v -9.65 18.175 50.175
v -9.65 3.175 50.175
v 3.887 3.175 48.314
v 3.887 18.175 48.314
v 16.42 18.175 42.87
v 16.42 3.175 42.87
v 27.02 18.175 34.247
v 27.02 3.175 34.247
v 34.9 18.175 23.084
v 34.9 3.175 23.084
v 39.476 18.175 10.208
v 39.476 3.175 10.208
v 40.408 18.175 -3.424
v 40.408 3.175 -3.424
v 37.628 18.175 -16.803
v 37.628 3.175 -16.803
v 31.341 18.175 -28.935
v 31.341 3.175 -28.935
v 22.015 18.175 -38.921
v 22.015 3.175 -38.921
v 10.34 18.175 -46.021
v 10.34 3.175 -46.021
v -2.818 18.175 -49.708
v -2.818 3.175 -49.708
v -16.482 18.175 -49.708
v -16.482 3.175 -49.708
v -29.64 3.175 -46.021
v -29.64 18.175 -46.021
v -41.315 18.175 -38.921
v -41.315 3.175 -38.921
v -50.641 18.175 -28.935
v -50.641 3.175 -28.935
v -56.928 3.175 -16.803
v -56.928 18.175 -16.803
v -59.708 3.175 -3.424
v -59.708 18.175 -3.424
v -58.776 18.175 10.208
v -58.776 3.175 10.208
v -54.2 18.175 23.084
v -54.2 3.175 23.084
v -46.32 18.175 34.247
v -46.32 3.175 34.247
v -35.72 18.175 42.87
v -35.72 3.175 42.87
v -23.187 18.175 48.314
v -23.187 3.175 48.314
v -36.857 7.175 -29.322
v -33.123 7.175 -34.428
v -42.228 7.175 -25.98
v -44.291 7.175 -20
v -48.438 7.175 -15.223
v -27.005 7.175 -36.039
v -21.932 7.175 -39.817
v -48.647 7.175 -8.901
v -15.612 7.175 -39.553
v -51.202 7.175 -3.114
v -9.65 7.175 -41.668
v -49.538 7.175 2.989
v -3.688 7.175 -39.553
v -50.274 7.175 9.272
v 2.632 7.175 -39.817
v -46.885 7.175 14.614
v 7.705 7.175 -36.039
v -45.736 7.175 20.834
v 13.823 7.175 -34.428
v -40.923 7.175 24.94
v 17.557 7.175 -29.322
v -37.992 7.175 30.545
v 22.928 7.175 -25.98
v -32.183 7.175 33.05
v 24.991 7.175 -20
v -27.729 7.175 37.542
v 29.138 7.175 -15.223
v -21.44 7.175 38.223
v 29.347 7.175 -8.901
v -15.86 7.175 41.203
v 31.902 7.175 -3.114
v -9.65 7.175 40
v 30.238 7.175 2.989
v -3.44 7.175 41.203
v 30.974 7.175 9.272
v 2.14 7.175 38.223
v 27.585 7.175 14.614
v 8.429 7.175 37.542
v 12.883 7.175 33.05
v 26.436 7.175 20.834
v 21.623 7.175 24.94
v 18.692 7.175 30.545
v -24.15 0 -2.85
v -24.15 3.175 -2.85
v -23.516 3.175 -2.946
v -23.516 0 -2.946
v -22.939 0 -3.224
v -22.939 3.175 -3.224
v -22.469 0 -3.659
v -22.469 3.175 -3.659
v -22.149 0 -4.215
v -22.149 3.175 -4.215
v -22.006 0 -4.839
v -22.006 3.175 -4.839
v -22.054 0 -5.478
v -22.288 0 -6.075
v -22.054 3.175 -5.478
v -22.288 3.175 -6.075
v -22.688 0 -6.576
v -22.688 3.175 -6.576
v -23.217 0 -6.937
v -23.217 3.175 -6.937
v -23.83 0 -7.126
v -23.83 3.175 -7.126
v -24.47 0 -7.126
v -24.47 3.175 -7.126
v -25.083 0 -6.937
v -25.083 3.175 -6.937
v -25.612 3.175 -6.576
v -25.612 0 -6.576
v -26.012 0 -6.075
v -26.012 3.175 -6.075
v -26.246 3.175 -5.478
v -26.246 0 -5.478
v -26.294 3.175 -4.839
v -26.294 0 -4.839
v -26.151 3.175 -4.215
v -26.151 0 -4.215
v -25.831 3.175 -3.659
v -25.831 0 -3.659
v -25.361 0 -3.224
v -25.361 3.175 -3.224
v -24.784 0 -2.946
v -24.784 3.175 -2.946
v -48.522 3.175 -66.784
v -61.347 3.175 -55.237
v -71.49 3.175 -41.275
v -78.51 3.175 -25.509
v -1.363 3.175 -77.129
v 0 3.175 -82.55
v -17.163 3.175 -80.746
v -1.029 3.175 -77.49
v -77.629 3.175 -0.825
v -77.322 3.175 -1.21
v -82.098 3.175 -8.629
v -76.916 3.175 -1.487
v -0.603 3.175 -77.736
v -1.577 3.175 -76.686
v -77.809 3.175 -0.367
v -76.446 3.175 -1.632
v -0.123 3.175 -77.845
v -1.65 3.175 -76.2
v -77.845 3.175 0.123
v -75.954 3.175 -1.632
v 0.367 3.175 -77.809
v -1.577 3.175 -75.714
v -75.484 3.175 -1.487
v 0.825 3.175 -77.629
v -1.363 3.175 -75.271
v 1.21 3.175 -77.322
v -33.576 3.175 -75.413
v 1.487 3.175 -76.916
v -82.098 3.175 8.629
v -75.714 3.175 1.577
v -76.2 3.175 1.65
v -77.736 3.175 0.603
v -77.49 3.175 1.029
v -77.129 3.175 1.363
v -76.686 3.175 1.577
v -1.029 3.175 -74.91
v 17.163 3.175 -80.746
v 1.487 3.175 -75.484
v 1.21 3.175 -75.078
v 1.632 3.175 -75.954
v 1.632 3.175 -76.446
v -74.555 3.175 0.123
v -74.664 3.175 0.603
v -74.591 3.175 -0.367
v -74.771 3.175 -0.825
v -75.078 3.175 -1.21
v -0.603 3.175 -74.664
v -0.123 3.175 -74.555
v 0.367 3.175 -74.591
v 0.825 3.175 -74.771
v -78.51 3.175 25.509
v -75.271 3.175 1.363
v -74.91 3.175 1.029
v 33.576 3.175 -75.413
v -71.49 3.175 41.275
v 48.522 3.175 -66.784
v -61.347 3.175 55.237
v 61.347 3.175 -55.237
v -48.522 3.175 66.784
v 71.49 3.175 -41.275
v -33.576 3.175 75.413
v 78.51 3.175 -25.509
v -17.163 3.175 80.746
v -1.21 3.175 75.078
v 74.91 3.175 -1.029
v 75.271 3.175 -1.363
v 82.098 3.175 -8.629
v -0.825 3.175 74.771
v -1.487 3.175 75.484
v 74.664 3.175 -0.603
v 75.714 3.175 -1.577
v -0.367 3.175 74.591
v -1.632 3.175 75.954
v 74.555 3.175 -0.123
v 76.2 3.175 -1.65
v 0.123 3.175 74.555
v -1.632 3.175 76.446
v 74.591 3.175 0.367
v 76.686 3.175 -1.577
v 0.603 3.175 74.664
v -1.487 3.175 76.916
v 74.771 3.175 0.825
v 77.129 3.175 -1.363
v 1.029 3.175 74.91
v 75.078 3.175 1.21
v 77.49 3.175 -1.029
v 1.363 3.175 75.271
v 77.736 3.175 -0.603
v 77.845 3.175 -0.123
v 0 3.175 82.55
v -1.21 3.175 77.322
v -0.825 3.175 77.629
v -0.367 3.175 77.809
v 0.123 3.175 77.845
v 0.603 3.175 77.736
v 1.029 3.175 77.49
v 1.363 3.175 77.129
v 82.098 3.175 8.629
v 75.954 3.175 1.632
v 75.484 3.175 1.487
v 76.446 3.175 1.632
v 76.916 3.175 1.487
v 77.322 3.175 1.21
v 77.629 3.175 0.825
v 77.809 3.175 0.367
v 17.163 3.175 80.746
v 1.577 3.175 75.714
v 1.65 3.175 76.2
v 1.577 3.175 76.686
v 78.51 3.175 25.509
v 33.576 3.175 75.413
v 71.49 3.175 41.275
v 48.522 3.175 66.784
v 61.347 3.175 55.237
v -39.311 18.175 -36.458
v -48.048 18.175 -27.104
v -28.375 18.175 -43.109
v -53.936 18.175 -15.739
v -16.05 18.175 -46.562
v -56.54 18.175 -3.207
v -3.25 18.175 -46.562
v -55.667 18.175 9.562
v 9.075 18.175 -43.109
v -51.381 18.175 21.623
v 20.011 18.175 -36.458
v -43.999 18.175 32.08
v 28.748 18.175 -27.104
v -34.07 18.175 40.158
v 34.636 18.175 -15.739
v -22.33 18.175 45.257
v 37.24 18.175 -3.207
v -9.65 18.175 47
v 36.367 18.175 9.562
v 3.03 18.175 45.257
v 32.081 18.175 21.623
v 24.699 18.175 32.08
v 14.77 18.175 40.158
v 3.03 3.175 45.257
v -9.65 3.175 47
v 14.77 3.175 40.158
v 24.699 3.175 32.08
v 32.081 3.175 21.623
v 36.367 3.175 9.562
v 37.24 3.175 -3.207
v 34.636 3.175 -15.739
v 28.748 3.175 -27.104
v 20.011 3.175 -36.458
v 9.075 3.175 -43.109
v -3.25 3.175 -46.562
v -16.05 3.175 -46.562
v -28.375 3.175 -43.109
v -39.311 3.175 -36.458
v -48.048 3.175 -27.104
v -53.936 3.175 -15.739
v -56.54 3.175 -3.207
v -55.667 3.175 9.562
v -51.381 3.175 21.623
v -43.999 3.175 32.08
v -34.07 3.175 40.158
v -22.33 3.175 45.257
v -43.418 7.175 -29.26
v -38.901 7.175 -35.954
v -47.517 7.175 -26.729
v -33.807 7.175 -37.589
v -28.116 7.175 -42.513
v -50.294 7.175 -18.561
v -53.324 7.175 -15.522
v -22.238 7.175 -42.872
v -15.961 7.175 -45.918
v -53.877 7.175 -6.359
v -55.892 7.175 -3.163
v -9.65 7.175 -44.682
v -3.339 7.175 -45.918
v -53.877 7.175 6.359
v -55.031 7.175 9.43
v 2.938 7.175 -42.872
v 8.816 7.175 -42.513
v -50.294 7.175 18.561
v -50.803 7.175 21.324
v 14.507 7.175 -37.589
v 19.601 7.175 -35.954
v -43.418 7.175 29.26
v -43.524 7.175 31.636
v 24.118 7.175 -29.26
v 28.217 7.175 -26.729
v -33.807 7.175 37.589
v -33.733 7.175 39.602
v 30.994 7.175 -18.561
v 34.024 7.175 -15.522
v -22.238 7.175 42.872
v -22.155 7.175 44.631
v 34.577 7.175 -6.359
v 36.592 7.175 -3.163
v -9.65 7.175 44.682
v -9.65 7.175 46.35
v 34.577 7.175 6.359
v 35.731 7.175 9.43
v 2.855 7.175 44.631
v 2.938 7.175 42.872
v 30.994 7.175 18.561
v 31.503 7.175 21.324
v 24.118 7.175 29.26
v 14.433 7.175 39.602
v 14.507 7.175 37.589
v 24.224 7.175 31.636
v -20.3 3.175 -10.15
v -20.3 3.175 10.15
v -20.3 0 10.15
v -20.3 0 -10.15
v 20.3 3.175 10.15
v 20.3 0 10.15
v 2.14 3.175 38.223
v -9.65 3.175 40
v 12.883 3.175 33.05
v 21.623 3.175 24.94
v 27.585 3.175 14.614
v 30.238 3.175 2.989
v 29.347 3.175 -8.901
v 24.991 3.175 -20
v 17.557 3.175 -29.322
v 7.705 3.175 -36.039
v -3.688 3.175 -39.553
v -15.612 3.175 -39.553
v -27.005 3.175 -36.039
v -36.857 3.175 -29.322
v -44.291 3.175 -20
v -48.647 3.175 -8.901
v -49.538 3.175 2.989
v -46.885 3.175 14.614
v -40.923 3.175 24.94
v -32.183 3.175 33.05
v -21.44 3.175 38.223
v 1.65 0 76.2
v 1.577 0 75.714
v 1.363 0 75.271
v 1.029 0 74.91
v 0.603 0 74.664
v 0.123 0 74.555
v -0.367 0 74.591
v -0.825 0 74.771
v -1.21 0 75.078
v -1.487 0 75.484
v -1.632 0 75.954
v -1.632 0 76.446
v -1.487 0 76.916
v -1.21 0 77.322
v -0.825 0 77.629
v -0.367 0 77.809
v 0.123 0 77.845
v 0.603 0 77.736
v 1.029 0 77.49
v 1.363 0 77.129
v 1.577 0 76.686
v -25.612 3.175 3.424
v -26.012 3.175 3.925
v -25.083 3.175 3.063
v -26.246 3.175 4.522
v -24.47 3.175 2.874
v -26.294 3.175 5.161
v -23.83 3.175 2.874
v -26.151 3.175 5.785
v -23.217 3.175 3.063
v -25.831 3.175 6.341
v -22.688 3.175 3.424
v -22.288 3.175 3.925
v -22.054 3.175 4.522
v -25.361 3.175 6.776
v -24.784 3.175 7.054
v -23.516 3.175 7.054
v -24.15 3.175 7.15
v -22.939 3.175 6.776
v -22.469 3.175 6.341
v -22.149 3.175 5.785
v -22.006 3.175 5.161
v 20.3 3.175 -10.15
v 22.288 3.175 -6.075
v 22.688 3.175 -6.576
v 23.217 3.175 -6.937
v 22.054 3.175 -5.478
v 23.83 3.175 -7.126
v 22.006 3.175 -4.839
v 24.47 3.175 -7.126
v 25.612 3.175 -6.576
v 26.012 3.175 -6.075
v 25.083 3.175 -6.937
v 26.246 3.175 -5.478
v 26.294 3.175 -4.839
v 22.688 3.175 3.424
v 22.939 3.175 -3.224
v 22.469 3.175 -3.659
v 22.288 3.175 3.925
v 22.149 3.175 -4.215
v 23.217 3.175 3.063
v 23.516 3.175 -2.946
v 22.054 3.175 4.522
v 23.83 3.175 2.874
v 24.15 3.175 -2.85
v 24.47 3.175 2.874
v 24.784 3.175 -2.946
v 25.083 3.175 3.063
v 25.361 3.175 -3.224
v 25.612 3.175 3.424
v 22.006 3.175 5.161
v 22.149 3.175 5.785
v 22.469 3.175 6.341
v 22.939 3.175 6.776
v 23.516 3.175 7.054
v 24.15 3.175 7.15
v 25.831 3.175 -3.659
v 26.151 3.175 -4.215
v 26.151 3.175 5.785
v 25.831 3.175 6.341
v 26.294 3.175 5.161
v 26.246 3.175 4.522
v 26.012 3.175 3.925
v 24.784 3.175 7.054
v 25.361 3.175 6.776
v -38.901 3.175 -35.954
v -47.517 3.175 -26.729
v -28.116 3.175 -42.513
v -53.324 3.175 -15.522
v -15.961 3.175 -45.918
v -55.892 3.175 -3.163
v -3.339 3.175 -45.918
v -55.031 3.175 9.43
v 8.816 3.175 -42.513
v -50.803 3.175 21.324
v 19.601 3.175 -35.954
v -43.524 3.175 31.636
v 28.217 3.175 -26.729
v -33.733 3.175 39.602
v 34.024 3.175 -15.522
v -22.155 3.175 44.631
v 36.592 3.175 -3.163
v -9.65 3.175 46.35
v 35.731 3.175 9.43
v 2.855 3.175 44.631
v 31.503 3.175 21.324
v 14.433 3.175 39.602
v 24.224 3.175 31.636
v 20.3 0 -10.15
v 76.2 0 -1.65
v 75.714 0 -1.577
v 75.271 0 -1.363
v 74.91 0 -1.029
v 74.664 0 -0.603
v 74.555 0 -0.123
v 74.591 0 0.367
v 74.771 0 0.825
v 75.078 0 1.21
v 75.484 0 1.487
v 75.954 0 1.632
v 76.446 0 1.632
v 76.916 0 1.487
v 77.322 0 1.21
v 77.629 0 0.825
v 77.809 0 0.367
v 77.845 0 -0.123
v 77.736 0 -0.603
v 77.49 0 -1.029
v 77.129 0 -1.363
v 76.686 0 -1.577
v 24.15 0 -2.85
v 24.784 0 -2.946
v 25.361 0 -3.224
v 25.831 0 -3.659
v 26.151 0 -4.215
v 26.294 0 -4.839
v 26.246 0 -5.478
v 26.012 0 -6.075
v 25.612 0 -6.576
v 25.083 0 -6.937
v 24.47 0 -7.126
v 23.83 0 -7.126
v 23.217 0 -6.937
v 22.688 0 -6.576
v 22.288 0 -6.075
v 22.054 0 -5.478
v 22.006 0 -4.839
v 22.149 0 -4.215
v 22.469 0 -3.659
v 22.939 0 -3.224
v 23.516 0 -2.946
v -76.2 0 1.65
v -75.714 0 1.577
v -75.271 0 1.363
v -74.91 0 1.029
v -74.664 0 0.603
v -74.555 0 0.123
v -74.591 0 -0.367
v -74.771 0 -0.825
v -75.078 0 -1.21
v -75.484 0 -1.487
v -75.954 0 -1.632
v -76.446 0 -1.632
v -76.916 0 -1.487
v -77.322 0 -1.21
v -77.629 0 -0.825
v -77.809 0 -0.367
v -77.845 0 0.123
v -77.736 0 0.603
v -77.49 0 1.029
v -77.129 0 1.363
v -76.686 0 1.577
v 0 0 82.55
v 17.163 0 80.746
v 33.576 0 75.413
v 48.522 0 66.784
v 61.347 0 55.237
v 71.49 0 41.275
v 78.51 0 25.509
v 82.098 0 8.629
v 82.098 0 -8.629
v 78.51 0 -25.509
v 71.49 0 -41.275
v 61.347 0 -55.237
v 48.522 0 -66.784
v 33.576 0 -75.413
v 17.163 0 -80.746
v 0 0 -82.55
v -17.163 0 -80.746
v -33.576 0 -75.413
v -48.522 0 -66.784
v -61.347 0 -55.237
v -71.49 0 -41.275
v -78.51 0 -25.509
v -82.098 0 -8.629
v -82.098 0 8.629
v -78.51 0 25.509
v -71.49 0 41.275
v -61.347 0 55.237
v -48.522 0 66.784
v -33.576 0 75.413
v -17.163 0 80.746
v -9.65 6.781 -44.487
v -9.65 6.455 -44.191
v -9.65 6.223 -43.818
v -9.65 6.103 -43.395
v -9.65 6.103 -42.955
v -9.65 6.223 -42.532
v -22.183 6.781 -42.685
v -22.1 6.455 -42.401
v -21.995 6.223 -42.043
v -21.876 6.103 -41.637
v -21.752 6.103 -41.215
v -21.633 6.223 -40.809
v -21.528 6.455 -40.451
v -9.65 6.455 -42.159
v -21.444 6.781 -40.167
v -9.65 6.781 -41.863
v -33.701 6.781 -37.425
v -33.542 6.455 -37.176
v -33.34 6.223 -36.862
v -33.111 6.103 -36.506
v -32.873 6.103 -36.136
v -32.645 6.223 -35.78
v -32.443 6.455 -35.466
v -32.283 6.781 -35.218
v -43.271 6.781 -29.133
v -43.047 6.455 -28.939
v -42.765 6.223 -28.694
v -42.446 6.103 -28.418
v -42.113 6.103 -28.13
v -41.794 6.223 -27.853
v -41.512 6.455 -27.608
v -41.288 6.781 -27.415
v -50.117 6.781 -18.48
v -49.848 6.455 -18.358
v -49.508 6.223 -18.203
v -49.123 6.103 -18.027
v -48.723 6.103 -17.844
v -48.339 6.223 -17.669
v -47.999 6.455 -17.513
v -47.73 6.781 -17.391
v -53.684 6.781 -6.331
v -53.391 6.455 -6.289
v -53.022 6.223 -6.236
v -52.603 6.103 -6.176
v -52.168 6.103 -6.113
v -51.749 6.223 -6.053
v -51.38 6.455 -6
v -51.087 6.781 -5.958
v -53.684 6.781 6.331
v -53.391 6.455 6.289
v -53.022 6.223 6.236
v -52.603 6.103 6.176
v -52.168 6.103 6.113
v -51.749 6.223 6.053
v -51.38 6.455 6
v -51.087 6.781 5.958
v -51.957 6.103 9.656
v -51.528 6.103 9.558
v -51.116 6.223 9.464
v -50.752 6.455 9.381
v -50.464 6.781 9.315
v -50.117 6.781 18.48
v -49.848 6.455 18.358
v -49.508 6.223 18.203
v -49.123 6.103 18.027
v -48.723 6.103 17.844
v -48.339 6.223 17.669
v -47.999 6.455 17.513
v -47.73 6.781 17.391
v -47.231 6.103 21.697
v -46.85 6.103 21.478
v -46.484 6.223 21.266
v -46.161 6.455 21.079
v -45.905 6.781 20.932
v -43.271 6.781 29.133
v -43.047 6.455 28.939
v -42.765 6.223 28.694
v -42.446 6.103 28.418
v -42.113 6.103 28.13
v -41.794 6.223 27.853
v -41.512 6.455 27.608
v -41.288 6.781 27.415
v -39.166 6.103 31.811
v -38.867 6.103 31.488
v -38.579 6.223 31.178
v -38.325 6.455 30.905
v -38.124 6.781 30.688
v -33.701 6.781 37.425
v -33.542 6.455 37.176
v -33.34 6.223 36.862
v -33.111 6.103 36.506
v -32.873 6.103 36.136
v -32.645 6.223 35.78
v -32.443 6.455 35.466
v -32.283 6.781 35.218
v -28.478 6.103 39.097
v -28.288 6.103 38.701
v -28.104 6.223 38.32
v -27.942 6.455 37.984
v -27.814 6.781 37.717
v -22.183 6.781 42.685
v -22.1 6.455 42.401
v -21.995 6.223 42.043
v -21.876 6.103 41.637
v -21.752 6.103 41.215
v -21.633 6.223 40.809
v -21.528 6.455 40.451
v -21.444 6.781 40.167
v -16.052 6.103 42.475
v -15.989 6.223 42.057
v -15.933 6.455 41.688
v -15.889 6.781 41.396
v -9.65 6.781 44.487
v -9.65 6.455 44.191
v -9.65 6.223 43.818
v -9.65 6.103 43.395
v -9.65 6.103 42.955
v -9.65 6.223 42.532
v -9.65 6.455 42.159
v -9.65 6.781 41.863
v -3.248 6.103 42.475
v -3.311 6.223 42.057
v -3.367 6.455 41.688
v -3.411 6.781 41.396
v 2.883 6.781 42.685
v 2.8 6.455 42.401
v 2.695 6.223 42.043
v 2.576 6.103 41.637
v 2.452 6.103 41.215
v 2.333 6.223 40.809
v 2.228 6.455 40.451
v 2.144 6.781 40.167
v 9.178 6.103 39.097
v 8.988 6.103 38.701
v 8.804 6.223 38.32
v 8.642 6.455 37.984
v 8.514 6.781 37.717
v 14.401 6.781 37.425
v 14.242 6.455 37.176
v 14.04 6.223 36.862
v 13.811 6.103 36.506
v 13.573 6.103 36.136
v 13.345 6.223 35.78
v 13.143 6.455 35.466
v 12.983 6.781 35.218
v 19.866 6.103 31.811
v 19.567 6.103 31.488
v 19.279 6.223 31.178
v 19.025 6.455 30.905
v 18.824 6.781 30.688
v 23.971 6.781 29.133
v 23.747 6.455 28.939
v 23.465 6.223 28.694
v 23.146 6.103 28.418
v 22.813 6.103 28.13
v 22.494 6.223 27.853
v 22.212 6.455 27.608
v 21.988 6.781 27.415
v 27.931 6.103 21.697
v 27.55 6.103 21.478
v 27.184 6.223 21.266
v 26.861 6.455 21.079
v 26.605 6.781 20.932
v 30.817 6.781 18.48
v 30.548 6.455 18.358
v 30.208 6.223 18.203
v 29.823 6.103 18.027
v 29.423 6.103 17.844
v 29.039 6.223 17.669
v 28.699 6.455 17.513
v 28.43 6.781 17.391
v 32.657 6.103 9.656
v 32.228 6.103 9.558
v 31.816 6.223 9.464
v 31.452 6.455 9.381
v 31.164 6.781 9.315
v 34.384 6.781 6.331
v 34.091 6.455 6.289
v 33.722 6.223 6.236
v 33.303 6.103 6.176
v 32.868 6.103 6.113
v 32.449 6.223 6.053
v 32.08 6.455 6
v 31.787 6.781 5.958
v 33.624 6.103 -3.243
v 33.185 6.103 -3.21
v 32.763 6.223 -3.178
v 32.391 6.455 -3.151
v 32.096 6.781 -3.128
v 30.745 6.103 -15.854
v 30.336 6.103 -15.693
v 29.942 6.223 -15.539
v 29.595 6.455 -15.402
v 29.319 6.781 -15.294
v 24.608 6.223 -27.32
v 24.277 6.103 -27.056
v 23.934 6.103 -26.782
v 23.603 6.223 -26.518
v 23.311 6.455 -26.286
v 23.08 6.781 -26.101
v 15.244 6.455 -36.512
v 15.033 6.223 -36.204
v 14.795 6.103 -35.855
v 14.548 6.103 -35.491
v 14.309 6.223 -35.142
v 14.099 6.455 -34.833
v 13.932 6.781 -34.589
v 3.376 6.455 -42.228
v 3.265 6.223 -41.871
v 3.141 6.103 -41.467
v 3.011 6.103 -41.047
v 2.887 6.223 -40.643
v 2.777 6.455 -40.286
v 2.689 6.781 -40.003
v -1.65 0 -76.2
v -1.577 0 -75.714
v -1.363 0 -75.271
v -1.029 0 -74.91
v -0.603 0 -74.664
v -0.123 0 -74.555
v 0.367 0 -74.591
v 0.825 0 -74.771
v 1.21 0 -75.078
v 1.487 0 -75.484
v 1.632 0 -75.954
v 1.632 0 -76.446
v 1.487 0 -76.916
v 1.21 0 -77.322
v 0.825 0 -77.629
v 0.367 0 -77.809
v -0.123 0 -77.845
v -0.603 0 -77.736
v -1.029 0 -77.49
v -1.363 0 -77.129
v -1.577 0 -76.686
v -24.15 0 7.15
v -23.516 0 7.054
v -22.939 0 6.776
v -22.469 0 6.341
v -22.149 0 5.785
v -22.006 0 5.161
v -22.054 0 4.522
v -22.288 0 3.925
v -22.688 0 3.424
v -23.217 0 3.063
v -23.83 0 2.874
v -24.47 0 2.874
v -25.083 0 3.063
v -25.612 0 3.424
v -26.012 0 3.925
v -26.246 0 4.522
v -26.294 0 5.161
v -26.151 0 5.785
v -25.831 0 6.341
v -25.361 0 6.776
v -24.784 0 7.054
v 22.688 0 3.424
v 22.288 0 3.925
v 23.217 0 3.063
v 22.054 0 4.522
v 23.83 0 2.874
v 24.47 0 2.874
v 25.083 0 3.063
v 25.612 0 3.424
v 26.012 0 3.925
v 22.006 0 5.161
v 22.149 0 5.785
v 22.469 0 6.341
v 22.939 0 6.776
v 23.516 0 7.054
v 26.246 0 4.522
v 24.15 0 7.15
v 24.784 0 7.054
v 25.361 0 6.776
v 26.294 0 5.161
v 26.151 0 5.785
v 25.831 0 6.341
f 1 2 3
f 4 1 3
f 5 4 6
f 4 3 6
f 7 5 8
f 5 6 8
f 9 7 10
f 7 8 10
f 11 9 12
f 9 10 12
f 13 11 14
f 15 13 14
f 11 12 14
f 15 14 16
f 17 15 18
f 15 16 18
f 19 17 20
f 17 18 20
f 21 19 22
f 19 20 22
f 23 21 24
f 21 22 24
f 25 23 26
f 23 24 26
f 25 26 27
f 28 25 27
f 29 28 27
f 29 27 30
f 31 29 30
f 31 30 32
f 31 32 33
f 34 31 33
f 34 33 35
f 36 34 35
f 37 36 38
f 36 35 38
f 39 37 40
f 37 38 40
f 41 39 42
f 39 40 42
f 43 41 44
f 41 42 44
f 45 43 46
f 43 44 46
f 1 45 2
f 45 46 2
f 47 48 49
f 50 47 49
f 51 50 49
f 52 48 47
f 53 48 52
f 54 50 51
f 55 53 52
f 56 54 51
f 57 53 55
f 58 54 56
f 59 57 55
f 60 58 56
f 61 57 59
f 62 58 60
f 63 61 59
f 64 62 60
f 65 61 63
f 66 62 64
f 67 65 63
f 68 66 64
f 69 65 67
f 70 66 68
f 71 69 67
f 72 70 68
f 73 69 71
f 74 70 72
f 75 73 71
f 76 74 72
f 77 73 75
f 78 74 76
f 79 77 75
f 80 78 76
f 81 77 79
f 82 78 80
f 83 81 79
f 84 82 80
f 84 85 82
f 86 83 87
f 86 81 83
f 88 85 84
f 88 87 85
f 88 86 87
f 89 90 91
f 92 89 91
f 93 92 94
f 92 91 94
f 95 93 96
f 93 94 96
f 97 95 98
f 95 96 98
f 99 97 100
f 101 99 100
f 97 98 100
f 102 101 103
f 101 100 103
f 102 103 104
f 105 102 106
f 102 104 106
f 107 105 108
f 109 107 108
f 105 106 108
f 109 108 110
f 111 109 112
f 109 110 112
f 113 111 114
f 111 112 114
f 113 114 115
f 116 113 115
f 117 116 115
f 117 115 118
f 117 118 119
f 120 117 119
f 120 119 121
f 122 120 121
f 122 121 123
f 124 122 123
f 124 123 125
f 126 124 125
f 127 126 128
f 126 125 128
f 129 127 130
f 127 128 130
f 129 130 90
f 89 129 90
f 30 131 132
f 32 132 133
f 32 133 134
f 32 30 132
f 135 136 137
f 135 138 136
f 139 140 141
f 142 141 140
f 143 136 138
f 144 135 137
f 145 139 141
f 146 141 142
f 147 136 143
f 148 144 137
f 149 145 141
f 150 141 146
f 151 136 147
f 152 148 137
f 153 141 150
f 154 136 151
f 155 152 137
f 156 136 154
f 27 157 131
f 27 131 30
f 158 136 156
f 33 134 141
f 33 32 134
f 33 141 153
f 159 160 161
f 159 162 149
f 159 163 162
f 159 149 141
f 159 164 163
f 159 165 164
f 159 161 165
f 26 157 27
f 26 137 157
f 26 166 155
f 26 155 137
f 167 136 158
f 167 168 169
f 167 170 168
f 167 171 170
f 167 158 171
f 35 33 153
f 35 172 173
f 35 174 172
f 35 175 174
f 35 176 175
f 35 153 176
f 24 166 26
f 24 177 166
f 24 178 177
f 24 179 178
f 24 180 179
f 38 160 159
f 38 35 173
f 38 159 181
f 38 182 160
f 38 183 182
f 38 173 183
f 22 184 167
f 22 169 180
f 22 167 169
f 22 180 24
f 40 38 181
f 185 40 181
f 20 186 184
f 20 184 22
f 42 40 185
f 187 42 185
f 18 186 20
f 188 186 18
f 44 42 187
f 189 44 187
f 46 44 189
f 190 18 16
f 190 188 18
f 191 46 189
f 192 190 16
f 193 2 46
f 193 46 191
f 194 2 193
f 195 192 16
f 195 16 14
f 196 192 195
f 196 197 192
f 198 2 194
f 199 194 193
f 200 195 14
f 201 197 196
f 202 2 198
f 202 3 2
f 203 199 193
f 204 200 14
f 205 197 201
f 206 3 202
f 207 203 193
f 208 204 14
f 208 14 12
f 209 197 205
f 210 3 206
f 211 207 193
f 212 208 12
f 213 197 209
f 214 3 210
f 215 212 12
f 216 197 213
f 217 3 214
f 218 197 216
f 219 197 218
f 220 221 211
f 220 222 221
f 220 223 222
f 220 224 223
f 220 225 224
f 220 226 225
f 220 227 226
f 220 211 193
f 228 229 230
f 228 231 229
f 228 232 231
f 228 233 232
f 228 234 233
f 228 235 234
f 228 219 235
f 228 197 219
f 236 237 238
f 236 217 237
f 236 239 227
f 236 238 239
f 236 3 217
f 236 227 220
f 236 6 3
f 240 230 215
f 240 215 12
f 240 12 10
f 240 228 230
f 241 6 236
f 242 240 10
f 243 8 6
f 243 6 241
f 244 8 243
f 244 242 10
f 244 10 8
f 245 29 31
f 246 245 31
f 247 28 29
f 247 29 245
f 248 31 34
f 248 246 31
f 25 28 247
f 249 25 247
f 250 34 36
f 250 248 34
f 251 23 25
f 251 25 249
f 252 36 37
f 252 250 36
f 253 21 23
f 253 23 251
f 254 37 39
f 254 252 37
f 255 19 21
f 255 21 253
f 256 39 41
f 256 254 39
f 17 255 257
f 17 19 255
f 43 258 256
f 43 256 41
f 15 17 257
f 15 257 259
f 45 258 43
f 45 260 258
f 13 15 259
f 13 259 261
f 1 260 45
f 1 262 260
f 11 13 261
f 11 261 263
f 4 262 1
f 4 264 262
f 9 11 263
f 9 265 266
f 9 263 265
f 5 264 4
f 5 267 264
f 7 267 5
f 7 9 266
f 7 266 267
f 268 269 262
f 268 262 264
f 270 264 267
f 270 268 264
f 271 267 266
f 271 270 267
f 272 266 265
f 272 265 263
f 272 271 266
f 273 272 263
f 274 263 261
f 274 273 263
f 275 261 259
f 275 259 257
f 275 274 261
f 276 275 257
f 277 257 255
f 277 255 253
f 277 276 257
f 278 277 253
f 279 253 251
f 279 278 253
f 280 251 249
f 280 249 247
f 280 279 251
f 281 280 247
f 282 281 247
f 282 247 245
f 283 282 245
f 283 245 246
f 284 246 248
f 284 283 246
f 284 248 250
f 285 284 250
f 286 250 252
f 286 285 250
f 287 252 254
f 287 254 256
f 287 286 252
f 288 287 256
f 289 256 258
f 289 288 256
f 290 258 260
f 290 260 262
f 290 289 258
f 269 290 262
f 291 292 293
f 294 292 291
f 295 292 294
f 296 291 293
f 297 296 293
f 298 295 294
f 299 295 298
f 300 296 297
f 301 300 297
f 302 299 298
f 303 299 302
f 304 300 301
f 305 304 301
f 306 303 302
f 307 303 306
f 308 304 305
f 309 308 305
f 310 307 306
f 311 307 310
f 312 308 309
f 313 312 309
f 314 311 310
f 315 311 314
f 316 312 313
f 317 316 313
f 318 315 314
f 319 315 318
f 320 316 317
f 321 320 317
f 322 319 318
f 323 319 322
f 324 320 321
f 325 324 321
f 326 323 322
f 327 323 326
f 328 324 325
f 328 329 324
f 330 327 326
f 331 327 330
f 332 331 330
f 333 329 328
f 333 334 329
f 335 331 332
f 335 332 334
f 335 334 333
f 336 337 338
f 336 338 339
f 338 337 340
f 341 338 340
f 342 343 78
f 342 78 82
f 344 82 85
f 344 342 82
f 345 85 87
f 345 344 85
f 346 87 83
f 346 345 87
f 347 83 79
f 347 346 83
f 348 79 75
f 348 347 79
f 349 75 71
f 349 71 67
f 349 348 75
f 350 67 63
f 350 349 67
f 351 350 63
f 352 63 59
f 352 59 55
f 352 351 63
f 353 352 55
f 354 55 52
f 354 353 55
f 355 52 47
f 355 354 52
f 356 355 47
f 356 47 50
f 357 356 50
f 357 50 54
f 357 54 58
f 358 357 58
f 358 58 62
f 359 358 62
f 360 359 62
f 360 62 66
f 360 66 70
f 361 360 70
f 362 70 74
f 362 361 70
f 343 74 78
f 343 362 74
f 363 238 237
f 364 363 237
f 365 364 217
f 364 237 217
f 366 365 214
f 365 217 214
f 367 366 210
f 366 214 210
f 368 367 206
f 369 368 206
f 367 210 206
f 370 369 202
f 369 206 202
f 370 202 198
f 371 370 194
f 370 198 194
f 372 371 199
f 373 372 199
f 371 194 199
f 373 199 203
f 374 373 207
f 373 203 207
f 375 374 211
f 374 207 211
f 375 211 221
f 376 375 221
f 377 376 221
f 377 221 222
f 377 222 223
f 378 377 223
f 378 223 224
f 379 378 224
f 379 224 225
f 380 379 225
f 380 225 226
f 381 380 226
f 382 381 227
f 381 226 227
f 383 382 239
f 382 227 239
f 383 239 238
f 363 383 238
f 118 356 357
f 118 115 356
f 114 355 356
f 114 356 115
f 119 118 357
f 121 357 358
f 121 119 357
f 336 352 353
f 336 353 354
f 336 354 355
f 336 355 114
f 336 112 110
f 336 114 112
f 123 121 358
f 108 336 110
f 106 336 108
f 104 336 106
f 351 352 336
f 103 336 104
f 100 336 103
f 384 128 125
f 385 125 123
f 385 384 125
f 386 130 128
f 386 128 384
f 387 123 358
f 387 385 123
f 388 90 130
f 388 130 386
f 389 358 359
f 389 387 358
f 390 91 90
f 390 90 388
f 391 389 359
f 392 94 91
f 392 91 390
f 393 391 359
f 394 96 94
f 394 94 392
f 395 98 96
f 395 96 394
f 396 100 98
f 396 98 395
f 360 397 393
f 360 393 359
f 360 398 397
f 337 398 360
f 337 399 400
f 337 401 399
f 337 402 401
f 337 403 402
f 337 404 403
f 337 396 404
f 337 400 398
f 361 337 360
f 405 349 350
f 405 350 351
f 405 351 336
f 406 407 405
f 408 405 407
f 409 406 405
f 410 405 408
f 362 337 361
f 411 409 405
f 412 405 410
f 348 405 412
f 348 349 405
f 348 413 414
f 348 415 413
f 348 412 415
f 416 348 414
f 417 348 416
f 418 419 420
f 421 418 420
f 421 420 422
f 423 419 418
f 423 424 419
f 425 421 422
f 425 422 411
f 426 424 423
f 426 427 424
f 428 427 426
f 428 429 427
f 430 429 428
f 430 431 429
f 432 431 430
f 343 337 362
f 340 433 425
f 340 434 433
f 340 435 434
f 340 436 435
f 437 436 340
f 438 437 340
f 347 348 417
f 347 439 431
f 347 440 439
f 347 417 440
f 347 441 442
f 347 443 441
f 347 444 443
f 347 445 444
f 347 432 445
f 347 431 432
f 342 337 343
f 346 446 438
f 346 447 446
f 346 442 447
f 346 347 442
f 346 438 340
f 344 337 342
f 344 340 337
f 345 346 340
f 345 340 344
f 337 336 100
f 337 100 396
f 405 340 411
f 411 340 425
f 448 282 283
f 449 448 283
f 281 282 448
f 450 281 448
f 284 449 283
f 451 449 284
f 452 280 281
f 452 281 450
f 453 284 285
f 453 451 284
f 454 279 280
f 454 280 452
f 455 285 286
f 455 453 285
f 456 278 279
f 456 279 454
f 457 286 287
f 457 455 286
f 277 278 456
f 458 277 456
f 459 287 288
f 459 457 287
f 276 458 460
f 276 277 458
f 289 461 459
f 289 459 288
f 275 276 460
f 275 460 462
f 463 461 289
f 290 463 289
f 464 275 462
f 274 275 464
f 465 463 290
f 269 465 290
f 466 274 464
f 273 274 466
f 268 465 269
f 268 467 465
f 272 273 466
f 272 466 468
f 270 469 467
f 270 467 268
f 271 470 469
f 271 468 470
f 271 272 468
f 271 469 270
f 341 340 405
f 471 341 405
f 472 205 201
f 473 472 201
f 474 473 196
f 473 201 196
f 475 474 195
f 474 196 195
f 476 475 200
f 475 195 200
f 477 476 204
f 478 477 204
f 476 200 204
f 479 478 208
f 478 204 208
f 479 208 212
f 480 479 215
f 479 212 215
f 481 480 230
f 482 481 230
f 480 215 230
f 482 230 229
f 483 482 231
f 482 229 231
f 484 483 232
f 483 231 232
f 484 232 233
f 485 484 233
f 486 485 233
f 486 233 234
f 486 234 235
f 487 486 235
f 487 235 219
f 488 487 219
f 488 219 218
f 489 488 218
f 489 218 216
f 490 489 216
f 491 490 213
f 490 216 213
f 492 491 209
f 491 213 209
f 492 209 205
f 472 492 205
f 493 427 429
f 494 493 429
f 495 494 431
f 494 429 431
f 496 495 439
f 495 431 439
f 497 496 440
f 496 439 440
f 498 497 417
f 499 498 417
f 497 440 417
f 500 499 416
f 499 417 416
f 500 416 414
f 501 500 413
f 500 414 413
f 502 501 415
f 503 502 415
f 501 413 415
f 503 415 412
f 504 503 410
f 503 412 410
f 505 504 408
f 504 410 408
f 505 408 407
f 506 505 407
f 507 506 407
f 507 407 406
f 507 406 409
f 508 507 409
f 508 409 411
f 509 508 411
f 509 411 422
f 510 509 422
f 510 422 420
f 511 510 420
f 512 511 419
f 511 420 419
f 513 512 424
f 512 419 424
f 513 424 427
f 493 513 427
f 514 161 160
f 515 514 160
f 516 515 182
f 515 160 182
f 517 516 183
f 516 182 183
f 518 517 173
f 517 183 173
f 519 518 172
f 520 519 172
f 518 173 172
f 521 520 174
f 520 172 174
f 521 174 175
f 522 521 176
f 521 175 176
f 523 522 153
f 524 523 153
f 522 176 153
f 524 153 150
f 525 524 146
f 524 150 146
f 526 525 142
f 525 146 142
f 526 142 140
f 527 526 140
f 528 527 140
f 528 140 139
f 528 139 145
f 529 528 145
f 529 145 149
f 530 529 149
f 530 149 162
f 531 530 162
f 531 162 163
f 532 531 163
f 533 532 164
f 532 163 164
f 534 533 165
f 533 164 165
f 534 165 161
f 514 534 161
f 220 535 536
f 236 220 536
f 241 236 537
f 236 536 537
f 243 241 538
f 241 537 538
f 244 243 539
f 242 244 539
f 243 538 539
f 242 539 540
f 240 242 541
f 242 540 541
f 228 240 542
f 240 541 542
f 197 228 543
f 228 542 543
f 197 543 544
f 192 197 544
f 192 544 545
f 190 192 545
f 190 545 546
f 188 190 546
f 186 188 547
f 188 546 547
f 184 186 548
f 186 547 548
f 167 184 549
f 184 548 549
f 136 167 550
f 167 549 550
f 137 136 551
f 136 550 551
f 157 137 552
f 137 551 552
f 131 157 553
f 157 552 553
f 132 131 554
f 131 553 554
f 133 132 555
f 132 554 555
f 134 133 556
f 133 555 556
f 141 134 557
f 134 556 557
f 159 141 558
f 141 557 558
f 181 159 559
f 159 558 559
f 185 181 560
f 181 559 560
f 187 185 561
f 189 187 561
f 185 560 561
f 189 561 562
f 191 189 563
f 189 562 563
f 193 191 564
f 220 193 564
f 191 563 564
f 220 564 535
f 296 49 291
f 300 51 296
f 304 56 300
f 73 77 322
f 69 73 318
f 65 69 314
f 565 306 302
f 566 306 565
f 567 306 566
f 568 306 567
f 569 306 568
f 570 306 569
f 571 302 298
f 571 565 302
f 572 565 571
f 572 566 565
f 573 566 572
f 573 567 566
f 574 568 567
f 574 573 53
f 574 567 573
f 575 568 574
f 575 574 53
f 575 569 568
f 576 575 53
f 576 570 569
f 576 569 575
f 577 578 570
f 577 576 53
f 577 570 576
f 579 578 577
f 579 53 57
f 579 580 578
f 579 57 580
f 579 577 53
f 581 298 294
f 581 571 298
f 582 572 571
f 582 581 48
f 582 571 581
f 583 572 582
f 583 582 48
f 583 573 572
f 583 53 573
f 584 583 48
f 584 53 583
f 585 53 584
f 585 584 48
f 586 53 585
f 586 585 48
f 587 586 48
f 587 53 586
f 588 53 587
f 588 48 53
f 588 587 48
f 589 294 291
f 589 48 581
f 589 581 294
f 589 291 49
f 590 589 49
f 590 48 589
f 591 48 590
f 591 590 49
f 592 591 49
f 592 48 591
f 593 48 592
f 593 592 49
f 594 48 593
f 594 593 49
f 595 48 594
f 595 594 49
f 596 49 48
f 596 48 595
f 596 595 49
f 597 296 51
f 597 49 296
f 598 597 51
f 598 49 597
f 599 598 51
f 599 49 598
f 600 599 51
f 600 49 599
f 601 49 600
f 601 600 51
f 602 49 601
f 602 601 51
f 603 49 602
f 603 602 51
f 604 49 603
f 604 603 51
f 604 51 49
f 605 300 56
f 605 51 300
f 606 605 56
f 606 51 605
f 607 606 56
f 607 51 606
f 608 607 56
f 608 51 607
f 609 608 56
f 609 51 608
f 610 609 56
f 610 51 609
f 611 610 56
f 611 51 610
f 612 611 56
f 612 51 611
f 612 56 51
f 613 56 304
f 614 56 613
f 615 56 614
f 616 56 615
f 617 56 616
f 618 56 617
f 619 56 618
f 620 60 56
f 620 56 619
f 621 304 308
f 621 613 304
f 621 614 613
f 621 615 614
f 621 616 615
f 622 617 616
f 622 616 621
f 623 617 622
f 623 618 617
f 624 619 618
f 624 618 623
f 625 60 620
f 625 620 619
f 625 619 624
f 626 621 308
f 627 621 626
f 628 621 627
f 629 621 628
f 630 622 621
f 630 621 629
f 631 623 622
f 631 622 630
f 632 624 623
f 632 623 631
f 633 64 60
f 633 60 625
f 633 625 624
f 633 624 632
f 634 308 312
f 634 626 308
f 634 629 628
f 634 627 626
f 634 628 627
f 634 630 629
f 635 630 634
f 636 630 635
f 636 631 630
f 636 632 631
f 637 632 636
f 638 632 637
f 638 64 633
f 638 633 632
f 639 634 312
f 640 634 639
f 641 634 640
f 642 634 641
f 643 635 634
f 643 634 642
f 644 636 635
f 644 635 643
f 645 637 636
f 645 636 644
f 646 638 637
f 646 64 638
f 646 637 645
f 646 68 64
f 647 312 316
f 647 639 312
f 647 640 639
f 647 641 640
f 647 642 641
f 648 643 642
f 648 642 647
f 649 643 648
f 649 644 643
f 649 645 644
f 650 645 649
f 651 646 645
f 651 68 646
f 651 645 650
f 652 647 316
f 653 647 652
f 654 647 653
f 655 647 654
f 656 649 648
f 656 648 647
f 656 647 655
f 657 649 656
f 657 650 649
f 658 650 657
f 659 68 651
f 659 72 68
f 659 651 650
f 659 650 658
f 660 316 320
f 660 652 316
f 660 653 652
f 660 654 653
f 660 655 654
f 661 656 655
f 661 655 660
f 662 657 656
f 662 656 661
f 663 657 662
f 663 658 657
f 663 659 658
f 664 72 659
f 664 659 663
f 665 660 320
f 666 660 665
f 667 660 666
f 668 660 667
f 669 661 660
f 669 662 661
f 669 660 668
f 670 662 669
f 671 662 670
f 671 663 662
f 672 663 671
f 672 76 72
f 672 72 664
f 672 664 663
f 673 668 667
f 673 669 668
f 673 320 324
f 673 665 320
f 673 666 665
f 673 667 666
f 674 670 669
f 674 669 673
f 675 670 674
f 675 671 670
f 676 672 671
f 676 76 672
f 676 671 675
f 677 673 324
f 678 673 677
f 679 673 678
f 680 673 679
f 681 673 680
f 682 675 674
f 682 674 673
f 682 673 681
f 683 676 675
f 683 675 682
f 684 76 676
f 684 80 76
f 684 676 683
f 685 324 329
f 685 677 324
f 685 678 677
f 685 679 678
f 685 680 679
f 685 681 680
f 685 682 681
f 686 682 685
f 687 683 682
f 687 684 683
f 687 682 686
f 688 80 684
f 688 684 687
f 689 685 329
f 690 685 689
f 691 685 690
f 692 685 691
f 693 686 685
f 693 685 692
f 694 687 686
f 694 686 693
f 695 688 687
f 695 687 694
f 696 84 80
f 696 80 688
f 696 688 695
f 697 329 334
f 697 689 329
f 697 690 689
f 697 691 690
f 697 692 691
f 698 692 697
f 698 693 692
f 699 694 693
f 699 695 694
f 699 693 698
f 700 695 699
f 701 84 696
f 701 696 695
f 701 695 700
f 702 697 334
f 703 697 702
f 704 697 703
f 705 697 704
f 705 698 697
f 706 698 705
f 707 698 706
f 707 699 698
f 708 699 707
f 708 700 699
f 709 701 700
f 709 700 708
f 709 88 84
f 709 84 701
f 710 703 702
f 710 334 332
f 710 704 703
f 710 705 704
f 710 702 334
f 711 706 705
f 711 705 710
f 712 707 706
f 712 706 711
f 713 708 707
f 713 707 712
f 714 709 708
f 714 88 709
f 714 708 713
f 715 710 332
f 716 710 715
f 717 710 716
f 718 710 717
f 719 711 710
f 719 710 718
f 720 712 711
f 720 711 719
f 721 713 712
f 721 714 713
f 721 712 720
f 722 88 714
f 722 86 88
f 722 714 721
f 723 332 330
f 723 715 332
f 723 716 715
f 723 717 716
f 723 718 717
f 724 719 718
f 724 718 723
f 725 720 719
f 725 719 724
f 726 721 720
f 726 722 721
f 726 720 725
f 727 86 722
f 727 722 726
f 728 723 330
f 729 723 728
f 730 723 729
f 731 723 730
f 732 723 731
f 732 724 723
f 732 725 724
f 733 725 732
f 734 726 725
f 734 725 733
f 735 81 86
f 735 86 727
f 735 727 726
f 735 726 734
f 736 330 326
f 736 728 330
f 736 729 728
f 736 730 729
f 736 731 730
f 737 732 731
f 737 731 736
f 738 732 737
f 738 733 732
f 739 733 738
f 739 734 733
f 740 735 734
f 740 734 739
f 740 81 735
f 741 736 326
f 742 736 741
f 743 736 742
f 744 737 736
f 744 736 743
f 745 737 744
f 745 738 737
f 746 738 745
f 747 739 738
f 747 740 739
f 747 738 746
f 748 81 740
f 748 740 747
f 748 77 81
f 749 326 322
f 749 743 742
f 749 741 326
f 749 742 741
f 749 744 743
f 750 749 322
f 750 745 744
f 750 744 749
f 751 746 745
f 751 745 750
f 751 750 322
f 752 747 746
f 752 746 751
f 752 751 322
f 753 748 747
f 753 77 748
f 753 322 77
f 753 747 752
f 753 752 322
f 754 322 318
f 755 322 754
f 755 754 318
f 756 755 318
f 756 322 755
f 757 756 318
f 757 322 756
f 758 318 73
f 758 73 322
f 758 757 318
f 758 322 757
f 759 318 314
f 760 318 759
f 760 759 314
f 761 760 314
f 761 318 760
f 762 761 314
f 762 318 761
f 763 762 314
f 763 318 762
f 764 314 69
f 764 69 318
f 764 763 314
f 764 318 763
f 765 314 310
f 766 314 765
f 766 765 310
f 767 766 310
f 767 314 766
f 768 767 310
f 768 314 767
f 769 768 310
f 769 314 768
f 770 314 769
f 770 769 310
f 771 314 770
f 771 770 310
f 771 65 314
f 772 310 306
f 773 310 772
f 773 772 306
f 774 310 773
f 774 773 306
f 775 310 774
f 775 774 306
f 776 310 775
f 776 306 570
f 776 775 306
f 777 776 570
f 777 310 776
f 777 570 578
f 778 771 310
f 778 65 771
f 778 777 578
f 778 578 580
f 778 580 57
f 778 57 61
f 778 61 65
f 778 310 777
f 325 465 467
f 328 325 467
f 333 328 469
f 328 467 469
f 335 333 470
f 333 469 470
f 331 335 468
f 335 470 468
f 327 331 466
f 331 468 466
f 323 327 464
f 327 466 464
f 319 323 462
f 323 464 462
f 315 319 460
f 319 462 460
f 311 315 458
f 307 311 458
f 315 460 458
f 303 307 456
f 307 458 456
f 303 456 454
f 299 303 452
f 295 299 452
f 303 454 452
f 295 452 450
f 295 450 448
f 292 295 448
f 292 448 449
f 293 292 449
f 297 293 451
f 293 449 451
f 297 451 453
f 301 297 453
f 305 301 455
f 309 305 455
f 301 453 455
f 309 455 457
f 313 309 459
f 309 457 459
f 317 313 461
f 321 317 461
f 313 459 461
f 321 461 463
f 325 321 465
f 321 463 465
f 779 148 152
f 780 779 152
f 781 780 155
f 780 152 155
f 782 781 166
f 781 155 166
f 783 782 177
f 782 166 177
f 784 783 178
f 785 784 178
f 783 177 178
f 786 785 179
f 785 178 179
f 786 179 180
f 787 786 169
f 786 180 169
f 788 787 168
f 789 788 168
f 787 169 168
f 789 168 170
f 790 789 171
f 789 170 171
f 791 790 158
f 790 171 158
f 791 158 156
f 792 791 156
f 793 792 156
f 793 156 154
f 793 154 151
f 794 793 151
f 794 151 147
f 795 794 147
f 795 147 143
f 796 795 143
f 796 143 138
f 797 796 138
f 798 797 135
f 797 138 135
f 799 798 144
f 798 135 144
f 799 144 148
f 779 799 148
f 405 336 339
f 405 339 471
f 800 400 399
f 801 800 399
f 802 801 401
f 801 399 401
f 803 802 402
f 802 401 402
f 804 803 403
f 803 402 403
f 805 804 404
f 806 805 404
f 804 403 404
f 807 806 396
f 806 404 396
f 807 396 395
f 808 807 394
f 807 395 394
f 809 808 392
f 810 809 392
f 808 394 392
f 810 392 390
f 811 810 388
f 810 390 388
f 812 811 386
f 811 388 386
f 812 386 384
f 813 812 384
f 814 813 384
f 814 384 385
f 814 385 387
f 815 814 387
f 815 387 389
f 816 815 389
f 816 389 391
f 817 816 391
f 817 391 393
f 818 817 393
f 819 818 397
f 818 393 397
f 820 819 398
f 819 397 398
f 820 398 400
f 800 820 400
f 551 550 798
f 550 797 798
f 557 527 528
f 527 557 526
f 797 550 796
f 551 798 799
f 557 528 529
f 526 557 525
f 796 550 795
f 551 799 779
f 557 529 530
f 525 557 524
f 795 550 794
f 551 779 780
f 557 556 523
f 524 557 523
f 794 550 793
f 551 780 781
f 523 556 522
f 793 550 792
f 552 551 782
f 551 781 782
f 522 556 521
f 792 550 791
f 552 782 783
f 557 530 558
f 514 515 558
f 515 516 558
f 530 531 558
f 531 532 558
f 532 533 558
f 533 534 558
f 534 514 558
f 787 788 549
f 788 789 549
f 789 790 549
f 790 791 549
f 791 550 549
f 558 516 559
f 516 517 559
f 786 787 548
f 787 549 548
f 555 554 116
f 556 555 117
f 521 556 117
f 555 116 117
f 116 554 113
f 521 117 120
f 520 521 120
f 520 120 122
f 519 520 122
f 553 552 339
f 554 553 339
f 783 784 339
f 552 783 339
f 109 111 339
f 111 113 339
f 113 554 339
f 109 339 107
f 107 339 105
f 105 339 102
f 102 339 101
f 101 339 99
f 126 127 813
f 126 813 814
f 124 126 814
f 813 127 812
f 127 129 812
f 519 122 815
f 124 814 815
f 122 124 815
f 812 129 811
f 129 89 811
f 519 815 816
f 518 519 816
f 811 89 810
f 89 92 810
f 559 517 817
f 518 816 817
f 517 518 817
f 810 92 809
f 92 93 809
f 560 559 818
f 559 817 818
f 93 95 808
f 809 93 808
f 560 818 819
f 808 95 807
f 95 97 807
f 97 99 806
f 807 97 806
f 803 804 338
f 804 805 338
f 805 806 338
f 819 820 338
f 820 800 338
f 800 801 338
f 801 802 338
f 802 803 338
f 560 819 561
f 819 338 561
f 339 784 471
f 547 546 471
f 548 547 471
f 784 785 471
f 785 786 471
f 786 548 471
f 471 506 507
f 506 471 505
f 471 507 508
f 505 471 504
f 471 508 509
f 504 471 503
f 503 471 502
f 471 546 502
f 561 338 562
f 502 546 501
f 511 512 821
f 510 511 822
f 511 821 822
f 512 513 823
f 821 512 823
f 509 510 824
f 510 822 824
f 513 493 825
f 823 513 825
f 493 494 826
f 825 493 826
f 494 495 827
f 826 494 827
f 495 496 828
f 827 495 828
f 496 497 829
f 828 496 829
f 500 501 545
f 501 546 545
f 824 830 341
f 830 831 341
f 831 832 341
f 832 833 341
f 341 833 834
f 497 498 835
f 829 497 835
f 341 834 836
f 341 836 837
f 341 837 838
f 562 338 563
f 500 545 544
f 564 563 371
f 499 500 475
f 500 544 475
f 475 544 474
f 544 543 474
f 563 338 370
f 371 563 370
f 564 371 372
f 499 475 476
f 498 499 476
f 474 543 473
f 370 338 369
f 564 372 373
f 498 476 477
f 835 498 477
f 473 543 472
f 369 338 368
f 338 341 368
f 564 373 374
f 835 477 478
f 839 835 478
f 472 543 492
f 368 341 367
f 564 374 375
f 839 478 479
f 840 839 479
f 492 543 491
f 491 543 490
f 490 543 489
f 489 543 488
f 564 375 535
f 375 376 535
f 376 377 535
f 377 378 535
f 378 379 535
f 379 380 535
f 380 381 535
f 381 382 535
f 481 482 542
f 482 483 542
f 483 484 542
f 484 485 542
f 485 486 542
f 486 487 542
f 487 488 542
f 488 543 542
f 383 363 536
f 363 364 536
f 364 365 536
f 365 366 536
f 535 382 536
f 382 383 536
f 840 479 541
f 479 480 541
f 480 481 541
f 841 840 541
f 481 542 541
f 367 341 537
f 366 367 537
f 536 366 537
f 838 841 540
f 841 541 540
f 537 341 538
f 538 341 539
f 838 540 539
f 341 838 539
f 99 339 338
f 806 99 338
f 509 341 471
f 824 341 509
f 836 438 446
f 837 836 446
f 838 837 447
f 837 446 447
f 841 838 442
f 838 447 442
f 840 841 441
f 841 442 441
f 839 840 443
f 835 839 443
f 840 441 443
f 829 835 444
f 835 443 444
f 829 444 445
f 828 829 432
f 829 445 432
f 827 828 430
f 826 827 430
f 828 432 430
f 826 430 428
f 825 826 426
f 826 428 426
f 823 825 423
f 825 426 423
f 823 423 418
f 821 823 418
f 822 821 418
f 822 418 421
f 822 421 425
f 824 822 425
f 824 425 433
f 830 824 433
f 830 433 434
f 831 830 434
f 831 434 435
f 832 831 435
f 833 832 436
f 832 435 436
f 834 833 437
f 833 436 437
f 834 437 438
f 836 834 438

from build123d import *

# Parameters (mm, degrees)
SKETCH1_R           = 82.55
BOSS_EXTRUDE1_DEPTH = 3.175
SKETCH2_R           = 2.15
SKETCH2_W           = 40.6
SKETCH2_H           = 20.3
CUT_EXTRUDE1_DEPTH  = 3.175
SKETCH3_R           = 1.65
CUT_EXTRUDE2_DEPTH  = 3.175
CIRPATTERN1_COUNT   = 4
SKETCH4_R           = 46.35
SKETCH4_R_2         = 40
BOSS_EXTRUDE2_DEPTH = 4
SKETCH7_R           = 1.5875
SKETCH8_R           = 50.175
SKETCH8_R_2         = 47
BOSS_EXTRUDE3_DEPTH = 15


with BuildPart() as part:
    # Sketch1 → Boss-Extrude1 (new body)
    with BuildSketch(Plane(origin=(0, 0, 0), x_dir=(1, 0, 0), z_dir=(0, 1, 0))):
        with Locations(Location((0, 0, 0), (0, 0, 270))):
            Circle(SKETCH1_R)
    extrude(amount=BOSS_EXTRUDE1_DEPTH)

    # Sketch2 → Cut-Extrude1 (cut)
    with BuildSketch(Plane(origin=(0, 3.175, 0), x_dir=(1, 0, 0), z_dir=(0, 1, 0))):
        with Locations(Location((-24.15, 5, 0), (0, 0, 270))):
            Circle(SKETCH2_R)
        with Locations(Location((-24.15, -5, 0), (0, 0, 270))):
            Circle(SKETCH2_R)
        with Locations(Location((24.15, 5, 0), (0, 0, 270))):
            Circle(SKETCH2_R)
        with Locations(Location((24.15, -5, 0), (0, 0, 270))):
            Circle(SKETCH2_R)
        Rectangle(SKETCH2_W, SKETCH2_H)
    extrude(amount=-CUT_EXTRUDE1_DEPTH, mode=Mode.SUBTRACT)

    # Sketch3 → Cut-Extrude2 (cut)
    with BuildSketch(Plane(origin=(0, 3.175, 0), x_dir=(1, 0, 0), z_dir=(0, 1, 0))):
        with Locations(Location((-76.2, 0, 0), (0, 0, 270))):
            Circle(SKETCH3_R)
    cut_extrude2 = extrude(amount=-CUT_EXTRUDE2_DEPTH, mode=Mode.SUBTRACT)

    # CirPattern1: Cut-Extrude2 ×4 about axis
    cirpattern1_axis = Axis((0, 0, 0), (0, 1, 0))
    for i in range(1, CIRPATTERN1_COUNT):
        add(cut_extrude2.rotate(cirpattern1_axis, i * 360 / CIRPATTERN1_COUNT), mode=Mode.SUBTRACT)

    # Sketch4 → Boss-Extrude2 (add)
    with BuildSketch(Plane(origin=(0, 3.175, 0), x_dir=(1, 0, 0), z_dir=(0, 1, 0))):
        with Locations(Location((-9.65, 0, 0), (0, 0, 270))):
            Circle(SKETCH4_R)
        with Locations(Location((-9.65, 0, 0), (0, 0, 270))):
            Circle(SKETCH4_R_2, mode=Mode.SUBTRACT)
    extrude(amount=BOSS_EXTRUDE2_DEPTH)

    # Sketch7 → Cut-Revolve1 (revolve, cut)
    with BuildSketch(Plane.XY, mode=Mode.PRIVATE) as cut_revolve1_sk:
        with Locations((-52.825, 7.675)):
            Circle(SKETCH7_R)
    revolve(cut_revolve1_sk.sketch.rotate(Axis((-9.65, 3.175, 0), (0, 1, 0)), 270), axis=Axis((-9.65, 3.175, 0), (0, 1, 0)), mode=Mode.SUBTRACT)

    # Sketch8 → Boss-Extrude3 (add)
    with BuildSketch(Plane(origin=(0, 3.175, 0), x_dir=(1, 0, 0), z_dir=(0, 1, 0))):
        with Locations(Location((-9.65, 0, 0), (0, 0, 270))):
            Circle(SKETCH8_R)
        with Locations(Location((-9.65, 0, 0), (0, 0, 270))):
            Circle(SKETCH8_R_2, mode=Mode.SUBTRACT)
    extrude(amount=BOSS_EXTRUDE3_DEPTH)


solid = part.part
